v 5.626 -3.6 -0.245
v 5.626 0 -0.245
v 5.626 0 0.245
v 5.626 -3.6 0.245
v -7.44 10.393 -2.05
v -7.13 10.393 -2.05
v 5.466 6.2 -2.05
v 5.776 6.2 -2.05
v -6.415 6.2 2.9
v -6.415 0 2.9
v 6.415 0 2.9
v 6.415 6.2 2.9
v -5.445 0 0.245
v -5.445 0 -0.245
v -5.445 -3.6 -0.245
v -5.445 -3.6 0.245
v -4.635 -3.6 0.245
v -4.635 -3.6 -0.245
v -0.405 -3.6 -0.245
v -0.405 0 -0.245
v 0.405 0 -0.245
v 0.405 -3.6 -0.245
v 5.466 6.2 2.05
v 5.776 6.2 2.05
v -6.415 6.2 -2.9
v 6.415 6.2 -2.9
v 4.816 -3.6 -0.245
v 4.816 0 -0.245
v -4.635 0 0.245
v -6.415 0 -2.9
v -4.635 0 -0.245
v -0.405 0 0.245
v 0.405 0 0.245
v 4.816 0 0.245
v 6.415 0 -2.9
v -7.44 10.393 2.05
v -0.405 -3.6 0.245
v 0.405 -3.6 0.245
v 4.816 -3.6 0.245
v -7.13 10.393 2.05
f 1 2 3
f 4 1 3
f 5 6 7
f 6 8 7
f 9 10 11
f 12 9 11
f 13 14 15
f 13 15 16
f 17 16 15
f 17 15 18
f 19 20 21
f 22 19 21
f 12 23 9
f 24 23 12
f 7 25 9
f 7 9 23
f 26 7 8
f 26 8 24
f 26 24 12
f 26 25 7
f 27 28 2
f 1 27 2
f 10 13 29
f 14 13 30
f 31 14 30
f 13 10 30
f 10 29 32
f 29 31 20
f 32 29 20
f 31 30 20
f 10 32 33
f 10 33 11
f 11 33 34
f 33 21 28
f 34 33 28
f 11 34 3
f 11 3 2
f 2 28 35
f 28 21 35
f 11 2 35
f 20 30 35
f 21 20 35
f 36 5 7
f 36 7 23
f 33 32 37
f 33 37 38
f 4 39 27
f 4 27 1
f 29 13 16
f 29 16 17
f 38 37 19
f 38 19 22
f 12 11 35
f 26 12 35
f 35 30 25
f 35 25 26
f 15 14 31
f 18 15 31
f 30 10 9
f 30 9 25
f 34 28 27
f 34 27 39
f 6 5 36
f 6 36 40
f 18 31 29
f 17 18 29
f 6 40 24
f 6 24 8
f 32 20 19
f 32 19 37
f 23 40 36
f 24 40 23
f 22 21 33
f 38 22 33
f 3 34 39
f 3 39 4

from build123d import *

# Parameters (mm, degrees)
SKETCH1_W           = 12.83
SKETCH1_H           = 5.8
BOSS_EXTRUDE1_DEPTH = 6.2
SKETCH2_W           = 0.31
SKETCH2_H           = 4.1
SKETCH4_W           = 0.81
SKETCH4_H           = 0.49
BOSS_EXTRUDE2_DEPTH = 3.6


with BuildPart() as part:
    # Sketch1 → Boss-Extrude1 (new body)
    with BuildSketch(Plane(origin=(0, 0, 0), x_dir=(1, 0, 0), z_dir=(0, 1, 0))):
        Rectangle(SKETCH1_W, SKETCH1_H)
    extrude(amount=BOSS_EXTRUDE1_DEPTH)

    # Sweep1: sweep along a path in Sketch3
    with BuildLine(Plane.XY.offset(2.9)) as sweep1_path:
        Line((5.621209299, 6.2), (-7.284880173, 10.392583278))
    # Sketch2 → Sweep1 (sweep)
    with BuildSketch(Plane(origin=(0, 6.2, 0), x_dir=(1, 0, 0), z_dir=(0, 1, 0))):
        with Locations((5.621209299, 0)):
            Rectangle(SKETCH2_W, SKETCH2_H)
    sweep(path=sweep1_path.line)

    # Sketch4 → Boss-Extrude2 (add)
    with BuildSketch(Plane.XZ):
        with Locations((-5.04, 0)):
            Rectangle(SKETCH4_W, SKETCH4_H)
        Rectangle(SKETCH4_W, SKETCH4_H)
        with Locations((5.220937528, 0)):
            Rectangle(SKETCH4_W, SKETCH4_H)
    extrude(amount=BOSS_EXTRUDE2_DEPTH)


solid = part.part
